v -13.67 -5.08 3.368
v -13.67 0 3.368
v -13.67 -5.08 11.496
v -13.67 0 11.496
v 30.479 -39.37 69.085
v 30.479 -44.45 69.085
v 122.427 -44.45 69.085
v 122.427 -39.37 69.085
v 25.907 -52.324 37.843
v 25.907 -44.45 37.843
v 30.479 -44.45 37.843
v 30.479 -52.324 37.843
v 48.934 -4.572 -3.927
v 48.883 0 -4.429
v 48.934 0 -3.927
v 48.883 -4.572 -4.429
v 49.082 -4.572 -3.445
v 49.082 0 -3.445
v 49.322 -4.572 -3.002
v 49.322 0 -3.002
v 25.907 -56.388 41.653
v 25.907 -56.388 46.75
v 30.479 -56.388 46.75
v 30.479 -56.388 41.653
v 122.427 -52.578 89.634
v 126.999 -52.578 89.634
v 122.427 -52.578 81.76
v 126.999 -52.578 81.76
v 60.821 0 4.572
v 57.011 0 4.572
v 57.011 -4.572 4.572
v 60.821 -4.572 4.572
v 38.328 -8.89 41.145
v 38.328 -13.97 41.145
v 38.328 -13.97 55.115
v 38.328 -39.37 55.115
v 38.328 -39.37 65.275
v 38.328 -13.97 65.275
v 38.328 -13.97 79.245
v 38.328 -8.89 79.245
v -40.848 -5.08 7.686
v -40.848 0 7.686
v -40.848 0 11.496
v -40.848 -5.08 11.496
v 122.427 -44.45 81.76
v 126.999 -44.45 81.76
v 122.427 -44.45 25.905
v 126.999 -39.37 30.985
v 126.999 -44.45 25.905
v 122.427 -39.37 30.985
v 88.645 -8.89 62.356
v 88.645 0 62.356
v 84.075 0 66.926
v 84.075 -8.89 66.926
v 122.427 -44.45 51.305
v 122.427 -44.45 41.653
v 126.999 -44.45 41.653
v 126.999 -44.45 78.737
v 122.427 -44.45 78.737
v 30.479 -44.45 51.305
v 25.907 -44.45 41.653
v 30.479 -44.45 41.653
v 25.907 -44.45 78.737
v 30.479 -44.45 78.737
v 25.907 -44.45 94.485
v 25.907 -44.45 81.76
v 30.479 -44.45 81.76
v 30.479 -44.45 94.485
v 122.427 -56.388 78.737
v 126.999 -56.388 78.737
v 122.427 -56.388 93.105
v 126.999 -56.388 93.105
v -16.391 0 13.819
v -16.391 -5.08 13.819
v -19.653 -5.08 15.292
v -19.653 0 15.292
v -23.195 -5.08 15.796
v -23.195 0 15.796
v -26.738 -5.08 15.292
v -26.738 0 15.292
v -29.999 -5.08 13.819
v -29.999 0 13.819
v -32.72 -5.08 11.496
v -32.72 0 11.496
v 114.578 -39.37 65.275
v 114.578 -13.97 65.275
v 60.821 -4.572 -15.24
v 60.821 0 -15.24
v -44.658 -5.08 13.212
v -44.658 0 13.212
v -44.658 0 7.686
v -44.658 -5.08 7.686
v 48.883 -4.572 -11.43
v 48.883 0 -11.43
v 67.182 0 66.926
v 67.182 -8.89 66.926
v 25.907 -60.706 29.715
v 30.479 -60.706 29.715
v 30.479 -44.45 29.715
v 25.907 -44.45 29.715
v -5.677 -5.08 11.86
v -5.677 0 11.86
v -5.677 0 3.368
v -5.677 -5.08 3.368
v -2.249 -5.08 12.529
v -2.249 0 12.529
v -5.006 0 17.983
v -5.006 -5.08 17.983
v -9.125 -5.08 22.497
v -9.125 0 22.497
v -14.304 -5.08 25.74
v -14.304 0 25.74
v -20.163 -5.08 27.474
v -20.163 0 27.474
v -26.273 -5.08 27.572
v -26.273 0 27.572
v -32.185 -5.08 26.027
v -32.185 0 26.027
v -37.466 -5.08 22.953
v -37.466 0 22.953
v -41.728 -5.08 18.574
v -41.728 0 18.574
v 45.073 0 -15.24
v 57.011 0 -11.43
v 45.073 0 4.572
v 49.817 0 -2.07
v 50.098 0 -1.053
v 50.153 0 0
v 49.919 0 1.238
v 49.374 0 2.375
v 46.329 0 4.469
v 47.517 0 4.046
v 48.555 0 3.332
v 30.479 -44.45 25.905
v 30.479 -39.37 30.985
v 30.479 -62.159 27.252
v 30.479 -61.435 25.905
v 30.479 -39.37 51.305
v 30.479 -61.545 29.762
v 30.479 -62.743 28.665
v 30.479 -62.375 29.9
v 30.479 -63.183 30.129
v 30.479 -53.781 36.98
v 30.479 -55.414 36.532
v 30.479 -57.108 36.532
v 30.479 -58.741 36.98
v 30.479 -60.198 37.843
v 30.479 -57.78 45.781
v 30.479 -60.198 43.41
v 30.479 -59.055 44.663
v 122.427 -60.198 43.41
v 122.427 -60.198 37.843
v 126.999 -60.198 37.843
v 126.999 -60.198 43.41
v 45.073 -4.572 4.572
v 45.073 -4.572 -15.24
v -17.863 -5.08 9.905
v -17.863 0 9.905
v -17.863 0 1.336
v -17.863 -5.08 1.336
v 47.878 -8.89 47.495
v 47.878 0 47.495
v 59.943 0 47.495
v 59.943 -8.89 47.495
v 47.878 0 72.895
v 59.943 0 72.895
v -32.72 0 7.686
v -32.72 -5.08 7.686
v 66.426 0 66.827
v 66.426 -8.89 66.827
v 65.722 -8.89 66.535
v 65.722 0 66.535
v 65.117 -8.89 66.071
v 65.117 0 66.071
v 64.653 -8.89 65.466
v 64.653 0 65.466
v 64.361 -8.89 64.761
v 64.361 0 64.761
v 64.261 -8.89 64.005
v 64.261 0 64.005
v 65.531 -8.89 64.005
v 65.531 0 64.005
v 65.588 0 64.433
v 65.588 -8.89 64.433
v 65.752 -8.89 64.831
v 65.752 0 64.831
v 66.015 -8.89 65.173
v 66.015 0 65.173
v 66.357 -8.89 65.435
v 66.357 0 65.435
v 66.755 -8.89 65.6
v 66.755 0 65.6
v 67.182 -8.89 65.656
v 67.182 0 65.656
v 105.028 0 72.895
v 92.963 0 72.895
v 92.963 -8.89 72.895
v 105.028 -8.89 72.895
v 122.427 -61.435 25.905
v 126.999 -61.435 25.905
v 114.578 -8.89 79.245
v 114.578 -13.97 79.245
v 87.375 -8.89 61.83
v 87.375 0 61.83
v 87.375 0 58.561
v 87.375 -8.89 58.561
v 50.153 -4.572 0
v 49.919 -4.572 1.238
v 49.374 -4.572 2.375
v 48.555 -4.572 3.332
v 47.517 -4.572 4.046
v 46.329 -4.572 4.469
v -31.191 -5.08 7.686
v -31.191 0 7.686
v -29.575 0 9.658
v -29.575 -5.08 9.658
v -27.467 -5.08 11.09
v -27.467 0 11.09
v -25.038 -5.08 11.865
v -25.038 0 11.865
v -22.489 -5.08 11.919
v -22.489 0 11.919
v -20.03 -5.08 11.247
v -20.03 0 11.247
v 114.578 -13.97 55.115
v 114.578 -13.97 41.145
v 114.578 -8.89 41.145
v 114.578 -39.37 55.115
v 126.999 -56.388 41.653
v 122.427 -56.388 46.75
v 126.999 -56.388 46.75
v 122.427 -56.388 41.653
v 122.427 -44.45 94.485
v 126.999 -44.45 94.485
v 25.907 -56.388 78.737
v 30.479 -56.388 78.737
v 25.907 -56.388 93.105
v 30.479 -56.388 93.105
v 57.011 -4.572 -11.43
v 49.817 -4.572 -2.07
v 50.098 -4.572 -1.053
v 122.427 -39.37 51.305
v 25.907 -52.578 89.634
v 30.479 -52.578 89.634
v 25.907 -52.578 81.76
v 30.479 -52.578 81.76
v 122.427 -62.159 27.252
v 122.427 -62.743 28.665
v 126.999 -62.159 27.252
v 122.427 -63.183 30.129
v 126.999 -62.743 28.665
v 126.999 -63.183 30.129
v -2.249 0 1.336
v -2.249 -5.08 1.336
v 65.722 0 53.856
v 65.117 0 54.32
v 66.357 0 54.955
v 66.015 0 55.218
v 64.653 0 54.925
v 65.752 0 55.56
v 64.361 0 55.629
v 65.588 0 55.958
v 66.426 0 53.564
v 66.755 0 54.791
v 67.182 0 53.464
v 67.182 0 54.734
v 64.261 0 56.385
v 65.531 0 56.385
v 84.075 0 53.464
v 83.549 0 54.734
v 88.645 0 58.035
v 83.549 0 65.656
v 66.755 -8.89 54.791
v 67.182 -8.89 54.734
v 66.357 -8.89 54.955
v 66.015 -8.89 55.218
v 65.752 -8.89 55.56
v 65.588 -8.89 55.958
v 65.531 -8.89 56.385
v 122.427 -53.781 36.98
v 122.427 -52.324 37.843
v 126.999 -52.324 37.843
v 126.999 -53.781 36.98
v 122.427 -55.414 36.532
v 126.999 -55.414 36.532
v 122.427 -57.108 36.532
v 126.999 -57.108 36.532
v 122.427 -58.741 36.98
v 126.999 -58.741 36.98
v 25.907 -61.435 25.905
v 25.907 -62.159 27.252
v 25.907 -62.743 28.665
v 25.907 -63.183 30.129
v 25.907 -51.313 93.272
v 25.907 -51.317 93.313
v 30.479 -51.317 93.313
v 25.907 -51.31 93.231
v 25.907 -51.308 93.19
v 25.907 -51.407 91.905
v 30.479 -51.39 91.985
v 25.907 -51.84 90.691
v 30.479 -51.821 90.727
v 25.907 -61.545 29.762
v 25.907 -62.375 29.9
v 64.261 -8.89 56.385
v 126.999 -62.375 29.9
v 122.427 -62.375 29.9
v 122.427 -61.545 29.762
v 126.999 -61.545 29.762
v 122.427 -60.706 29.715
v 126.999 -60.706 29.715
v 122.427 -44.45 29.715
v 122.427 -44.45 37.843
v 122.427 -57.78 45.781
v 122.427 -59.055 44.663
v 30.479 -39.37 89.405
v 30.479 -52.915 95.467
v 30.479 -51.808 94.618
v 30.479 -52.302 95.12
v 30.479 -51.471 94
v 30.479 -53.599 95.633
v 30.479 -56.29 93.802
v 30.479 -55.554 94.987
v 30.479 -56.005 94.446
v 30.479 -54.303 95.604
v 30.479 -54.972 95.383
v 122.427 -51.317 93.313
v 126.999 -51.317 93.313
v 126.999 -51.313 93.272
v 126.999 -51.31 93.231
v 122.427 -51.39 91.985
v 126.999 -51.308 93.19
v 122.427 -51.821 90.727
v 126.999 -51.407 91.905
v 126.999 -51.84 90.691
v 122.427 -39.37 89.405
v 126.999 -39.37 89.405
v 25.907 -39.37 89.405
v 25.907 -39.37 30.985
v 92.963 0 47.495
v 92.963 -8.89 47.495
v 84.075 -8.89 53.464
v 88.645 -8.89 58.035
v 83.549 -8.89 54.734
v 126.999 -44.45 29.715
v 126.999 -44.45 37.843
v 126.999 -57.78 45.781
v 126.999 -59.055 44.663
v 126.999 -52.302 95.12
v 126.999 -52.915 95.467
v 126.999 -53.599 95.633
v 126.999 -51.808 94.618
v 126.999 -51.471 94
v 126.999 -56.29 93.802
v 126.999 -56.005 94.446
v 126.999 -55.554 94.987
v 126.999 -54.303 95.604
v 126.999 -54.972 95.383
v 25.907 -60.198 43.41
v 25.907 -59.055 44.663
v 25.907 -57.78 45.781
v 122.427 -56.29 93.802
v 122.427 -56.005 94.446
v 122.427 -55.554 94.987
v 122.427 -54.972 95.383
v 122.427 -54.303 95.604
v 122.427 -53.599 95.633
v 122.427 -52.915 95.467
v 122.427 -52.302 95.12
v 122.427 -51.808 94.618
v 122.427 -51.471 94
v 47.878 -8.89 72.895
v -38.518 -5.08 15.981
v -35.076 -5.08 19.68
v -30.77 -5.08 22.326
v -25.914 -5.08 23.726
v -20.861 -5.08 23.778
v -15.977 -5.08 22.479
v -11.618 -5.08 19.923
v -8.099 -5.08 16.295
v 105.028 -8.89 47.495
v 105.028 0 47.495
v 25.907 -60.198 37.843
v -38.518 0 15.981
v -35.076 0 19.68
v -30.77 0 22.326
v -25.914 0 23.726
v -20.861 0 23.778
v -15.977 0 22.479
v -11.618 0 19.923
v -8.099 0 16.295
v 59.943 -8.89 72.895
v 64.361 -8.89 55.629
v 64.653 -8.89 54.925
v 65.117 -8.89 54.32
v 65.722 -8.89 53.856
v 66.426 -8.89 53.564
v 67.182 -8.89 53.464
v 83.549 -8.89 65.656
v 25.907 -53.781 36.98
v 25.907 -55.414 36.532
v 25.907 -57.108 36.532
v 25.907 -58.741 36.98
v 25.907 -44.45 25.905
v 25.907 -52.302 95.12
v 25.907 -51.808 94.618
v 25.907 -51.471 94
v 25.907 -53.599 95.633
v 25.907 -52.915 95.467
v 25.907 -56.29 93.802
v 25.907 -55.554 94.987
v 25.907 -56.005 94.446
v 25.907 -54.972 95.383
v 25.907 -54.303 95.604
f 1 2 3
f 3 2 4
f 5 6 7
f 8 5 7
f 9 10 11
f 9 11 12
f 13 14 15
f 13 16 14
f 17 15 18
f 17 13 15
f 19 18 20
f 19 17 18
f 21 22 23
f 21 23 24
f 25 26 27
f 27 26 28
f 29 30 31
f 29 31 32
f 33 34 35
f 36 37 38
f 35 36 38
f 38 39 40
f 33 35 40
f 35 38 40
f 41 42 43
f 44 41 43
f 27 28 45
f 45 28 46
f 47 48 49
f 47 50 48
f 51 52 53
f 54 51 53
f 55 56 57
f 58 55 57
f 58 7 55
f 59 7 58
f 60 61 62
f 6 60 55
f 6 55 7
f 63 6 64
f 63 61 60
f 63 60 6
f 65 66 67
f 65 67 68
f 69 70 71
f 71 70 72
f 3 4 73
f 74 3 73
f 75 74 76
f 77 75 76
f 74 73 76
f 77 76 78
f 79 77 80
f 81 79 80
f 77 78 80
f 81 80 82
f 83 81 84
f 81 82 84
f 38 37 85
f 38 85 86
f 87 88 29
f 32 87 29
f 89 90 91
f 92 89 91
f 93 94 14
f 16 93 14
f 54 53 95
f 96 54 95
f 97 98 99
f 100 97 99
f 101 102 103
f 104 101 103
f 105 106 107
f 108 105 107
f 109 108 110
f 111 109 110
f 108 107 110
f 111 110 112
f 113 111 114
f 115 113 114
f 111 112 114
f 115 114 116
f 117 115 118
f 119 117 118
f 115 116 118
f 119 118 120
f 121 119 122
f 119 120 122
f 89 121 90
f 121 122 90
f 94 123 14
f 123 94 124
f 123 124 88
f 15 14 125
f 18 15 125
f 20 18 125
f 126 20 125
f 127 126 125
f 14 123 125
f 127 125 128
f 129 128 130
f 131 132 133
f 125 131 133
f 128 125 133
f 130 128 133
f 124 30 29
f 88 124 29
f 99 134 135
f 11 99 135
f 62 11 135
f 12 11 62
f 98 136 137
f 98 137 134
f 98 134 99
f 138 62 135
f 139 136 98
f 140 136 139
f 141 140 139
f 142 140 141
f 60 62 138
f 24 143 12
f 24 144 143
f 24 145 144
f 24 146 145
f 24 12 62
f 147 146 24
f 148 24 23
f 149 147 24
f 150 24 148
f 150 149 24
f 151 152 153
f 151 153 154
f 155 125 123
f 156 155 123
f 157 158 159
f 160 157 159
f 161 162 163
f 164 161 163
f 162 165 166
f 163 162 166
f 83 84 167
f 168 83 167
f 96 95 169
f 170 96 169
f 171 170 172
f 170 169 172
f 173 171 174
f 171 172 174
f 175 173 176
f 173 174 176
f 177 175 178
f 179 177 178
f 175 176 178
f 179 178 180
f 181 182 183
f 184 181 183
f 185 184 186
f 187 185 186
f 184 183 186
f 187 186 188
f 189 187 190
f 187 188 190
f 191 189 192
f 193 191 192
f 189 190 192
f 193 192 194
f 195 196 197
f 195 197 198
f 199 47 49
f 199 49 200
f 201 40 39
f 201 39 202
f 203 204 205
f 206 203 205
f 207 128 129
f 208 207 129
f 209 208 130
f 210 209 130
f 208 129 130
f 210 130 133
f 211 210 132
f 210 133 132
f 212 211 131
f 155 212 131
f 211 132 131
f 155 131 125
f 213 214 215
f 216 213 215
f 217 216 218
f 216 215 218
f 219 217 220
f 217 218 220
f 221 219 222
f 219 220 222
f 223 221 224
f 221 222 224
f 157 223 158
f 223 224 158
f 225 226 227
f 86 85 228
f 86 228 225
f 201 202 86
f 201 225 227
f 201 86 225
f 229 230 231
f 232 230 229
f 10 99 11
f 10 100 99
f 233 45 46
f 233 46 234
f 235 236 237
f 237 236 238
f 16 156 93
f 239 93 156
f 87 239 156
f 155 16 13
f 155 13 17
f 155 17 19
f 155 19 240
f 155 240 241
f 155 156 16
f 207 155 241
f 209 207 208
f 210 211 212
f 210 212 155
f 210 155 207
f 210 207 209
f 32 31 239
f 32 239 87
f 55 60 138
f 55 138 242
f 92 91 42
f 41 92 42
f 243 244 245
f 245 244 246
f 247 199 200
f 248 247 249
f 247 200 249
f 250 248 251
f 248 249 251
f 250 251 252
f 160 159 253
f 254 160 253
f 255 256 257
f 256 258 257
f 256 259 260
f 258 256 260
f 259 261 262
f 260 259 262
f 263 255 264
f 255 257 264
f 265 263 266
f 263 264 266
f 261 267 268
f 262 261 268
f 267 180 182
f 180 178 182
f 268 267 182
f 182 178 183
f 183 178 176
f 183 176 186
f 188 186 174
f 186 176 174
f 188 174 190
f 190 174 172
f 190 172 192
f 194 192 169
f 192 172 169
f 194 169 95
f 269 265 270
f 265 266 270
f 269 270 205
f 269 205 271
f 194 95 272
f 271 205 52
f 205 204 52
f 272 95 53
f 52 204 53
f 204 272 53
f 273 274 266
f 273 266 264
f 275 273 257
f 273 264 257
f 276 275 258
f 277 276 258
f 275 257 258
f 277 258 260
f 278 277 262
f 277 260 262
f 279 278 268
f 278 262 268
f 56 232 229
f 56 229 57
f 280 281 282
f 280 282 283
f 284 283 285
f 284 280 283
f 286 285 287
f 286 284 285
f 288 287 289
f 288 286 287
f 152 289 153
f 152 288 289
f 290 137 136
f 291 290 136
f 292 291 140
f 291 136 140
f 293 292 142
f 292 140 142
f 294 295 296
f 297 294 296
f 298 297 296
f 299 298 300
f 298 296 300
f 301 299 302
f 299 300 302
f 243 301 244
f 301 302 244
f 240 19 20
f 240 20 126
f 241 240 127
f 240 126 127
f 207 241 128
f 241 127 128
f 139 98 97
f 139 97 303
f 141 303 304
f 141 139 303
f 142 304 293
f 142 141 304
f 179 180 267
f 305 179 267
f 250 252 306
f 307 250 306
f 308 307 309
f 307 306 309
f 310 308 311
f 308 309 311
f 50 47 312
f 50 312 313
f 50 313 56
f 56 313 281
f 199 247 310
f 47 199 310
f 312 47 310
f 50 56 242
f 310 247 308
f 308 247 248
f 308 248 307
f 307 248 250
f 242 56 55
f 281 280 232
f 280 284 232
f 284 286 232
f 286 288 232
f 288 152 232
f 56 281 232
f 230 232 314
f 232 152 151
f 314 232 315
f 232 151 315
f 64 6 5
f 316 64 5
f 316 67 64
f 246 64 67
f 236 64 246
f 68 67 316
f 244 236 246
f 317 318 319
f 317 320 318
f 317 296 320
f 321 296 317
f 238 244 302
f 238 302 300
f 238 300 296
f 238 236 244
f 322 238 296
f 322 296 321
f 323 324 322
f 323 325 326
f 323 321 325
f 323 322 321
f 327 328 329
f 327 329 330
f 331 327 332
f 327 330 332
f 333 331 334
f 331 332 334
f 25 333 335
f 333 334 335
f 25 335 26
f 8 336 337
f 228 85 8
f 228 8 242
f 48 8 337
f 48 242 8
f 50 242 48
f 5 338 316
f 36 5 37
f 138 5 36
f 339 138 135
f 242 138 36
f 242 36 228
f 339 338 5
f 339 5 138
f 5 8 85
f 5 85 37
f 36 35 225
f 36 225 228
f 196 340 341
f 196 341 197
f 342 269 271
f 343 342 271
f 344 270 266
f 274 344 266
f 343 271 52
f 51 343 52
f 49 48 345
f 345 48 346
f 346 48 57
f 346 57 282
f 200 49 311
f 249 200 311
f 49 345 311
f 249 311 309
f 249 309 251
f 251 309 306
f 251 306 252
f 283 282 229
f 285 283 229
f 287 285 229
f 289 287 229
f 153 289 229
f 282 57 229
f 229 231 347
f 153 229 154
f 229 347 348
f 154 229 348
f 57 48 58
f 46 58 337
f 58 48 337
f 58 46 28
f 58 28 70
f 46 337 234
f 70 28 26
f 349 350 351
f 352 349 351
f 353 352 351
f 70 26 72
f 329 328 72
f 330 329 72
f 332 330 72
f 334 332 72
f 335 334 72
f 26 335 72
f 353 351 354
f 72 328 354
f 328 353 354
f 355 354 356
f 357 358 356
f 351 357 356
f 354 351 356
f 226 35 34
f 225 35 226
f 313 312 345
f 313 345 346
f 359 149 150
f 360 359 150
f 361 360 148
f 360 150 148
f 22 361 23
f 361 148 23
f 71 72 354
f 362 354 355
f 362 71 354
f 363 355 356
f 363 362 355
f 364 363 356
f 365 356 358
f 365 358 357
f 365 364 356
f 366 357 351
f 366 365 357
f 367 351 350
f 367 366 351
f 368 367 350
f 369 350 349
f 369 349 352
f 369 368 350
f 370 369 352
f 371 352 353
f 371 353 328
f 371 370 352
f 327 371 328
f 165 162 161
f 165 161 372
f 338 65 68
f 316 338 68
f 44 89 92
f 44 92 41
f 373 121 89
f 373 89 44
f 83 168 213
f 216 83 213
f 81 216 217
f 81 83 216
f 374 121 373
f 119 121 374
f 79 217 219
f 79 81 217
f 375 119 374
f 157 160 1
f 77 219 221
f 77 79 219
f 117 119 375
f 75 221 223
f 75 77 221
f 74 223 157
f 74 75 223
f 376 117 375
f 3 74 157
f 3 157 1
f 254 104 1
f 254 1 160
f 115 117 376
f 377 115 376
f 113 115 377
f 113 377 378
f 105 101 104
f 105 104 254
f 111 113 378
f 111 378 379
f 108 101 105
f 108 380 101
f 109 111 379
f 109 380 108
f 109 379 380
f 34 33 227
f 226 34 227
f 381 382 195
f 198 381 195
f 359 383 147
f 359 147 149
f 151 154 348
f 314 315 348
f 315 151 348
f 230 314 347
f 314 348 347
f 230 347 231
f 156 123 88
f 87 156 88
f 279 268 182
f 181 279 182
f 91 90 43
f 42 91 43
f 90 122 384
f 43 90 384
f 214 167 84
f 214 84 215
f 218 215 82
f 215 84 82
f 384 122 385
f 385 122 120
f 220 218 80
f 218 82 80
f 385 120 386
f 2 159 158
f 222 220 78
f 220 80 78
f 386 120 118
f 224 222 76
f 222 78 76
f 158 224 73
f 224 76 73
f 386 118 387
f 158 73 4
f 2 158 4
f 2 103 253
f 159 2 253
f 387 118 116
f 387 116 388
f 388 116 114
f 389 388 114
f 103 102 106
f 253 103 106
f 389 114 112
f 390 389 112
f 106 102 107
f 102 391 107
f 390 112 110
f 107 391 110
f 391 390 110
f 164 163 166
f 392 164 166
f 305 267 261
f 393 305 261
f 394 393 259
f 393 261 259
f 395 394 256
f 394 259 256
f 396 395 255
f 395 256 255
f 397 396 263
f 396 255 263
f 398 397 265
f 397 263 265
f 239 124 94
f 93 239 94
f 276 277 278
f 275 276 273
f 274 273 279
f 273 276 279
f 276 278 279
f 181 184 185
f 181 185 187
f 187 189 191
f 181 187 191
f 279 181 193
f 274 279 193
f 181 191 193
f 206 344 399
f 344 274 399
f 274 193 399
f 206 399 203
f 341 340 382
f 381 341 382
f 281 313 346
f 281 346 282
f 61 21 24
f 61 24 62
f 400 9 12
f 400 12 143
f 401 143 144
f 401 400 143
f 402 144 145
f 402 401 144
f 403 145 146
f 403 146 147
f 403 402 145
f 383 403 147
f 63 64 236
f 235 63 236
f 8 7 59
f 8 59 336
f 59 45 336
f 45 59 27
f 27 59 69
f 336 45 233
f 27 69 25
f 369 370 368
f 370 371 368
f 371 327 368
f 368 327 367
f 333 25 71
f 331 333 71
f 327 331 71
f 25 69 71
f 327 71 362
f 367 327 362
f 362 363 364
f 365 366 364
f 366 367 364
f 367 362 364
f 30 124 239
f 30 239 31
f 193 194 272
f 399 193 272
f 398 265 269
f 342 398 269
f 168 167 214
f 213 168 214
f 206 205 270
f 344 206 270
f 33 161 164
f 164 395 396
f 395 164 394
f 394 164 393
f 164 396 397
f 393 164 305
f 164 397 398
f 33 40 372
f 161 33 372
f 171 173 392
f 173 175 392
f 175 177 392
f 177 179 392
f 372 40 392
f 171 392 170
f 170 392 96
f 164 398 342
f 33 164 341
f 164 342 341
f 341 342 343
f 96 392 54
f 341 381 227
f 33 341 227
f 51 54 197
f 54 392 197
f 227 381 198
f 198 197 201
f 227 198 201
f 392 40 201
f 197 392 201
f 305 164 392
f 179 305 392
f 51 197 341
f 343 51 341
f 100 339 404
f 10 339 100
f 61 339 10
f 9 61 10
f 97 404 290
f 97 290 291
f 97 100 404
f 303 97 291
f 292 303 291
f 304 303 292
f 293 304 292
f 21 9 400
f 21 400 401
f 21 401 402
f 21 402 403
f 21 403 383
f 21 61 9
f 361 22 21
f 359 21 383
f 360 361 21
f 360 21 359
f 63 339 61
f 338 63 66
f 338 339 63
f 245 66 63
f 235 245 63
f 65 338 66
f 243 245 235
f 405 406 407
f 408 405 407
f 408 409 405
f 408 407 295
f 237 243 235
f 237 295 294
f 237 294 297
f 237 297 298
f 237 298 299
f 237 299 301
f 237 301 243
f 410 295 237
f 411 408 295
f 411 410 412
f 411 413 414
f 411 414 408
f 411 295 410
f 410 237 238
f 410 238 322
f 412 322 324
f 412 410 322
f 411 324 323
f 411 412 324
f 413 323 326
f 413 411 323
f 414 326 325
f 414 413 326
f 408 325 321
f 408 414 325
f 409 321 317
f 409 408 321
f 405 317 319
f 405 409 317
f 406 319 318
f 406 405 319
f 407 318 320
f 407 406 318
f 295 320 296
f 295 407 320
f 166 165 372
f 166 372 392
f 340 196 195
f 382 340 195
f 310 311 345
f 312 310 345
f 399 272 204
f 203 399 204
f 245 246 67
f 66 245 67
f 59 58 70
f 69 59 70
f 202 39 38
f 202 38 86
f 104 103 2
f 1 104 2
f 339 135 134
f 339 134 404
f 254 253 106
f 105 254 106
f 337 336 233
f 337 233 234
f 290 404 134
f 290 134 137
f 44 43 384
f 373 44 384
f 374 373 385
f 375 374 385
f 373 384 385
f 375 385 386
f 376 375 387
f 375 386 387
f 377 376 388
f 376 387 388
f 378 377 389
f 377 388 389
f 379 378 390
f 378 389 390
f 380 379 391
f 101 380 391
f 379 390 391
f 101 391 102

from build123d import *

# Parameters (mm, degrees)
F1_DEPTH  = 5.08
F2_W      = 3.81
F2_H      = 3.81
F2_H_2    = 16.002
F3_DEPTH  = 4.572
F4_R      = 2.54
F6_DEPTH  = 8.89
F5_W      = 12.065
F5_H      = 25.4
F7_W      = 76.2508
F7_H      = 38.1
F8_DEPTH  = 5.08
F11_DEPTH = 50.546
F12_W     = 12.4206
F12_H     = 25.4
F13_DEPTH = 25.4
F14_W     = 91.948
F14_H     = 25.4
F15_DEPTH = 25.4
F16_W     = 8.128
F16_H     = 3.0225940797
F16_W_2   = 3.81
F17_DEPTH = 50.546
F18_R     = 2.54
F19_SIZE  = 5.07999
F20_SIZE  = 5.07999
F22_DEPTH = 25.4
F23_SIZE  = 5.08
F24_SIZE  = 5.08
F25_DEPTH = 57.15
F26_R     = 7.62
F27_R     = 7.62
F29_DEPTH = 101.092


# Not quite as in the source:
# - a fillet or chamfer is up to 0.001 mm smaller than in the source, because OpenCascade refuses the exact size
# - a feature names something its author has since deleted; it is built from what else it names


with BuildPart() as f1:
    # F0 (on Front) → F1 (new body)
    with BuildSketch(Plane.XZ):
        with BuildLine():
            Line((-13.6702175791, 3.3680211509), (-13.6702175791, 11.4960211509))
            ThreePointArc((-13.6702175791, 11.4960211509), (-23.1952175791, 15.7957607383), (-32.7202175791, 11.4960211509))
            Line((-32.7202175791, 11.4960211509), (-32.7202175791, 7.6860211509))
            Line((-32.7202175791, 7.6860211509), (-31.1910058421, 7.6860211509))
            ThreePointArc((-31.1910058421, 7.6860211509), (-25.0379678472, 11.8650180854), (-17.8627536235, 9.9053771004))
            Line((-17.8627536235, 9.9053771004), (-17.8627536235, 1.3360211509))
            Line((-17.8627536235, 1.3360211509), (-2.2494181128, 1.3360211509))
            Line((-2.2494181128, 1.3360211509), (-2.2494181128, 12.5290875188))
            ThreePointArc((-2.2494181128, 12.5290875188), (-23.214575579, 27.7308374634), (-44.6582175791, 13.2118413985))
            Line((-44.6582175791, 13.2118413985), (-44.6582175791, 7.6860211509))
            Line((-44.6582175791, 7.6860211509), (-40.8482175791, 7.6860211509))
            Line((-40.8482175791, 7.6860211509), (-40.8482175791, 11.4960211509))
            ThreePointArc((-40.8482175791, 11.4960211509), (-23.3892785102, 23.9227565337), (-5.6768820684, 11.8600322155))
            Line((-5.6768820684, 11.8600322155), (-5.6768820684, 3.3680211509))
            Line((-5.6768820684, 3.3680211509), (-13.6702175791, 3.3680211509))
        make_face()
    extrude(amount=F1_DEPTH)


with BuildPart() as f3:
    # F2 (on Front) → F3 (new body)
    with BuildSketch(Plane.XZ):
        with Locations((46.9784255706, -13.335)):
            Rectangle(F2_W, F2_H)
        Polygon((60.8214255706, -15.24), (60.8214255706, -11.43), (57.0114255706, -11.43), (48.8834255706, -11.43), (48.8834255706, -15.24), align=None)
        with BuildLine():
            Line((45.0734255706, -11.43), (48.8834255706, -11.43))
            Line((48.8834255706, -11.43), (48.8834255706, -3.556))
            ThreePointArc((48.8834255706, -3.556), (49.8785151524, -1.9066034221), (50.1534255706, 0))
            ThreePointArc((50.1534255706, 0), (48.5549154183, 3.3320998308), (45.0734255706, 4.572))
            Line((45.0734255706, 4.572), (45.0734255706, -11.43))
        make_face()
        with Locations((58.9164255706, -3.429)):
            Rectangle(F2_W, F2_H_2)
    extrude(amount=F3_DEPTH)

    # F4
    f4_edges = [f3.edges().sort_by_distance(p)[0] for p in [
        (48.883426, -2.286, -3.556),
    ]]
    fillet(f4_edges, radius=F4_R)


with BuildPart() as f6:
    # F5 (on Front) → F6 (new body)
    with BuildSketch(Plane.XZ):
        with BuildLine():
            Line((64.2612756615, 64.0052915247), (64.2612756615, 56.3852915247))
            ThreePointArc((64.2612756615, 56.3852915247), (65.1168167537, 54.3198326169), (67.1822756615, 53.4642915247))
            Line((67.1822756615, 53.4642915247), (84.0748242118, 53.4642915247))
            Line((84.0748242118, 53.4642915247), (88.6452756615, 58.0347429745))
            Line((88.6452756615, 58.0347429745), (88.6452756615, 62.3558400749))
            Line((88.6452756615, 62.3558400749), (84.0748242118, 66.9262915247))
            Line((84.0748242118, 66.9262915247), (67.1822756615, 66.9262915247))
            ThreePointArc((67.1822756615, 66.9262915247), (65.1168167537, 66.0707504326), (64.2612756615, 64.0052915247))
        make_face()
        with BuildLine():
            Line((83.5487729875, 54.7342915247), (67.1822756615, 54.7342915247))
            ThreePointArc((67.1822756615, 54.7342915247), (66.0148423658, 55.217858229), (65.5312756615, 56.3852915247))
            Line((65.5312756615, 56.3852915247), (65.5312756615, 64.0052915247))
            ThreePointArc((65.5312756615, 64.0052915247), (66.0148423658, 65.1727248204), (67.1822756615, 65.6562915247))
            Line((67.1822756615, 65.6562915247), (83.5487729875, 65.6562915247))
            Line((83.5487729875, 65.6562915247), (87.3752756615, 61.8297888507))
            Line((87.3752756615, 61.8297888507), (87.3752756615, 58.5607941987))
            Line((87.3752756615, 58.5607941987), (83.5487729875, 54.7342915247))
        make_face(mode=Mode.SUBTRACT)
    extrude(amount=F6_DEPTH)



with BuildPart() as f6b:
    # F5 (on Front) → F6, piece 2 (new body)
    with BuildSketch(Plane.XZ):
        with Locations((53.9104570084, 60.1952915247)):
            Rectangle(F5_W, F5_H)
    extrude(amount=F6_DEPTH)


with BuildPart() as f6c:
    # F5 (on Front) → F6, piece 3 (new body)
    with BuildSketch(Plane.XZ):
        with Locations((98.9955507601, 60.1952915247)):
            Rectangle(F5_W, F5_H)
    extrude(amount=F6_DEPTH)


with BuildPart() as f6_1:
    add(f6.part)

    add(f6b.part)  # F8 merges F6b

    add(f6c.part)  # F8 merges F6c
    # F7 (on face) → F8 (join)
    with BuildSketch(Plane.XZ.offset(8.89)):
        with Locations((76.4530038843, 60.1952915247)):
            Rectangle(F7_W, F7_H)
        Polygon((59.9429570084, 47.4952915247), (47.8779570084, 47.4952915247), (47.8779570084, 72.8952915247), (59.9429570084, 72.8952915247), (59.9429570084, 67.5330780989), (76.4530038843, 60.1952915247), (59.9429570084, 52.8575049505), align=None, mode=Mode.SUBTRACT)
        Polygon((59.9429570084, 72.8952915247), (47.8779570084, 72.8952915247), (59.9429570084, 67.5330780989), align=None)
        Polygon((59.9429570084, 67.5330780989), (59.9429570084, 52.8575049505), (76.4530038843, 60.1952915247), align=None)
        Polygon((47.8779570084, 72.8952915247), (47.8779570084, 47.4952915247), (59.9429570084, 52.8575049505), (59.9429570084, 67.5330780989), align=None)
        Polygon((59.9429570084, 52.8575049505), (47.8779570084, 47.4952915247), (59.9429570084, 47.4952915247), align=None)
    extrude(amount=F8_DEPTH)

    # F10 (on offset) → F11 (join, symmetric)
    with BuildSketch(Plane(origin=(76.4530038843, 0, 0), x_dir=(0, -1, 0), z_dir=(-1, 0, 0))):
        Polygon((39.37, 65.2752915247), (13.97, 65.2752915247), (13.97, 60.1952915247), (44.45, 60.1952915247), (44.45, 94.4852915247), (39.37, 94.4852915247), align=None)
        Polygon((44.45, 60.1952915247), (13.97, 60.1952915247), (13.97, 55.1152915247), (39.37, 55.1152915247), (39.37, 25.9052915247), (44.45, 25.9052915247), align=None)
    extrude(amount=F11_DEPTH, both=True)

    # F12 (on face) → F13 (cut)
    with BuildSketch(Plane.XY.offset(65.2752915247)):
        with Locations((32.1173038843, -26.67)):
            Rectangle(F12_W, F12_H)
        with Locations((120.7887038843, -26.67)):
            Rectangle(F12_W, F12_H)
    extrude(amount=-F13_DEPTH, mode=Mode.SUBTRACT)

    # F14 (on face) → F15 (cut)
    with BuildSketch(Plane.XZ.offset(44.45)):
        with Locations((76.4530038843, 81.7852915247)):
            Rectangle(F14_W, F14_H)
        with Locations((76.4530038843, 38.6052915247)):
            Rectangle(F14_W, F14_H)
    extrude(amount=-F15_DEPTH, mode=Mode.SUBTRACT)

    # F16 (on offset) → F17 (join, symmetric)
    with BuildSketch(Plane(origin=(76.4530038843, 0, 0), x_dir=(0, -1, 0), z_dir=(-1, 0, 0))):
        with Locations((48.514, 80.2485885645)):
            Rectangle(F16_W, F16_H)
        Polygon((68.326, 29.7152915247), (44.45, 29.7152915247), (44.45, 25.9052915247), (72.136, 25.9052915247), (72.136, 49.2732915247), (68.326, 49.2732915247), align=None)
        with BuildLine():
            Line((56.388, 41.6532915247), (44.45, 41.6532915247))
            Line((44.45, 41.6532915247), (44.45, 37.8432915247))
            Line((44.45, 37.8432915247), (52.324, 37.8432915247))
            ThreePointArc((52.324, 37.8432915247), (56.261, 36.4755130172), (60.198, 37.8432915247))
            Line((60.198, 37.8432915247), (60.198, 49.2732915247))
            Line((60.198, 49.2732915247), (56.388, 49.2732915247))
            Line((56.388, 49.2732915247), (56.388, 41.6532915247))
        make_face()
        with Locations((54.483, 80.2485885645)):
            Rectangle(F16_W_2, F16_H)
        with BuildLine():
            Line((52.578, 89.6338856044), (52.578, 81.7598856044))
            Line((52.578, 81.7598856044), (56.388, 81.7598856044))
            Line((56.388, 81.7598856044), (56.388, 97.7618856044))
            ThreePointArc((56.388, 97.7618856044), (52.9065101523, 96.5219854351), (51.308, 93.1898856044))
            ThreePointArc((51.308, 93.1898856044), (51.5829104182, 91.2832821823), (52.578, 89.6338856044))
        make_face()
    extrude(amount=F17_DEPTH, both=True)

    # F18
    f18_edges = [f6_1.edges().sort_by_distance(p)[0] for p in [
        (76.453004, -56.388, 97.761886),
    ]]
    fillet(f18_edges, radius=F18_R)

    # F19 (size 5.08 in the source; OpenCascade refuses exactly that, so slightly less here)
    f19_edges = [f6_1.edges().sort_by_distance(p)[0] for p in [
        (28.193004, -39.37, 94.485292),
    ]]
    chamfer(f19_edges, length=F19_SIZE)

    # F20 (size 5.08 in the source; OpenCascade refuses exactly that, so slightly less here)
    f20_edges = [f6_1.edges().sort_by_distance(p)[0] for p in [
        (124.713004, -39.37, 94.485292),
    ]]
    chamfer(f20_edges, length=F20_SIZE)

    # F21 (on face) → F22 (cut)
    with BuildSketch(Plane(origin=(0, 0, 78.7372915247), x_dir=(1, 0, 0), z_dir=(0, 0, -1))):
        Polygon((30.4790038843, 56.388), (30.4790038843, 44.45), (122.4270038843, 44.45), (122.4270038843, 72.136), (30.4790038843, 72.136), align=None)
    extrude(amount=-F22_DEPTH, mode=Mode.SUBTRACT)

    # F23
    f23_edges = [f6_1.edges().sort_by_distance(p)[0] for p in [
        (28.193004, -39.37, 25.905292),
    ]]
    chamfer(f23_edges, length=F23_SIZE)

    # F24
    f24_edges = [f6_1.edges().sort_by_distance(p)[0] for p in [
        (124.713004, -39.37, 25.905292),
    ]]
    chamfer(f24_edges, length=F24_SIZE)

    # F21 (on face) → F25 (cut, symmetric)
    with BuildSketch(Plane(origin=(0, 0, 78.7372915247), x_dir=(1, 0, 0), z_dir=(0, 0, -1))):
        Polygon((30.4790038843, 56.388), (30.4790038843, 44.45), (122.4270038843, 44.45), (122.4270038843, 72.136), (30.4790038843, 72.136), align=None)
    extrude(amount=F25_DEPTH, both=True, mode=Mode.SUBTRACT)

    # F26
    f26_edges = [f6_1.edges().sort_by_distance(p)[0] for p in [
        (124.713004, -72.136, 25.905292),
        (124.713004, -68.326, 29.715292),
    ]]
    fillet(f26_edges, radius=F26_R)

    # F27
    f27_edges = [f6_1.edges().sort_by_distance(p)[0] for p in [
        (28.193004, -72.136, 25.905292),
        (28.193004, -68.326, 29.715292),
    ]]
    fillet(f27_edges, radius=F27_R)

    # F28 (on face) → F29 (cut, through all)
    with BuildSketch(Plane.YZ.offset(126.9990038843)):
        with BuildLine():
            ThreePointArc((-60.598748991, 24.6616829248), (-63.0615335267, 37.892157408), (-54.0813514617, 47.9154848394))
            Line((-54.0813514617, 47.9154848394), (-60.1272594347, 63.0867996139))
            ThreePointArc((-60.1272594347, 63.0867996139), (-78.4719237933, 43.3532709658), (-74.9058635737, 16.6470530035))
            Line((-74.9058635737, 16.6470530035), (-60.598748991, 24.6616829248))
        make_face()
    extrude(amount=-F29_DEPTH, mode=Mode.SUBTRACT)


solid = Compound([f1.part, f3.part, f6_1.part])
